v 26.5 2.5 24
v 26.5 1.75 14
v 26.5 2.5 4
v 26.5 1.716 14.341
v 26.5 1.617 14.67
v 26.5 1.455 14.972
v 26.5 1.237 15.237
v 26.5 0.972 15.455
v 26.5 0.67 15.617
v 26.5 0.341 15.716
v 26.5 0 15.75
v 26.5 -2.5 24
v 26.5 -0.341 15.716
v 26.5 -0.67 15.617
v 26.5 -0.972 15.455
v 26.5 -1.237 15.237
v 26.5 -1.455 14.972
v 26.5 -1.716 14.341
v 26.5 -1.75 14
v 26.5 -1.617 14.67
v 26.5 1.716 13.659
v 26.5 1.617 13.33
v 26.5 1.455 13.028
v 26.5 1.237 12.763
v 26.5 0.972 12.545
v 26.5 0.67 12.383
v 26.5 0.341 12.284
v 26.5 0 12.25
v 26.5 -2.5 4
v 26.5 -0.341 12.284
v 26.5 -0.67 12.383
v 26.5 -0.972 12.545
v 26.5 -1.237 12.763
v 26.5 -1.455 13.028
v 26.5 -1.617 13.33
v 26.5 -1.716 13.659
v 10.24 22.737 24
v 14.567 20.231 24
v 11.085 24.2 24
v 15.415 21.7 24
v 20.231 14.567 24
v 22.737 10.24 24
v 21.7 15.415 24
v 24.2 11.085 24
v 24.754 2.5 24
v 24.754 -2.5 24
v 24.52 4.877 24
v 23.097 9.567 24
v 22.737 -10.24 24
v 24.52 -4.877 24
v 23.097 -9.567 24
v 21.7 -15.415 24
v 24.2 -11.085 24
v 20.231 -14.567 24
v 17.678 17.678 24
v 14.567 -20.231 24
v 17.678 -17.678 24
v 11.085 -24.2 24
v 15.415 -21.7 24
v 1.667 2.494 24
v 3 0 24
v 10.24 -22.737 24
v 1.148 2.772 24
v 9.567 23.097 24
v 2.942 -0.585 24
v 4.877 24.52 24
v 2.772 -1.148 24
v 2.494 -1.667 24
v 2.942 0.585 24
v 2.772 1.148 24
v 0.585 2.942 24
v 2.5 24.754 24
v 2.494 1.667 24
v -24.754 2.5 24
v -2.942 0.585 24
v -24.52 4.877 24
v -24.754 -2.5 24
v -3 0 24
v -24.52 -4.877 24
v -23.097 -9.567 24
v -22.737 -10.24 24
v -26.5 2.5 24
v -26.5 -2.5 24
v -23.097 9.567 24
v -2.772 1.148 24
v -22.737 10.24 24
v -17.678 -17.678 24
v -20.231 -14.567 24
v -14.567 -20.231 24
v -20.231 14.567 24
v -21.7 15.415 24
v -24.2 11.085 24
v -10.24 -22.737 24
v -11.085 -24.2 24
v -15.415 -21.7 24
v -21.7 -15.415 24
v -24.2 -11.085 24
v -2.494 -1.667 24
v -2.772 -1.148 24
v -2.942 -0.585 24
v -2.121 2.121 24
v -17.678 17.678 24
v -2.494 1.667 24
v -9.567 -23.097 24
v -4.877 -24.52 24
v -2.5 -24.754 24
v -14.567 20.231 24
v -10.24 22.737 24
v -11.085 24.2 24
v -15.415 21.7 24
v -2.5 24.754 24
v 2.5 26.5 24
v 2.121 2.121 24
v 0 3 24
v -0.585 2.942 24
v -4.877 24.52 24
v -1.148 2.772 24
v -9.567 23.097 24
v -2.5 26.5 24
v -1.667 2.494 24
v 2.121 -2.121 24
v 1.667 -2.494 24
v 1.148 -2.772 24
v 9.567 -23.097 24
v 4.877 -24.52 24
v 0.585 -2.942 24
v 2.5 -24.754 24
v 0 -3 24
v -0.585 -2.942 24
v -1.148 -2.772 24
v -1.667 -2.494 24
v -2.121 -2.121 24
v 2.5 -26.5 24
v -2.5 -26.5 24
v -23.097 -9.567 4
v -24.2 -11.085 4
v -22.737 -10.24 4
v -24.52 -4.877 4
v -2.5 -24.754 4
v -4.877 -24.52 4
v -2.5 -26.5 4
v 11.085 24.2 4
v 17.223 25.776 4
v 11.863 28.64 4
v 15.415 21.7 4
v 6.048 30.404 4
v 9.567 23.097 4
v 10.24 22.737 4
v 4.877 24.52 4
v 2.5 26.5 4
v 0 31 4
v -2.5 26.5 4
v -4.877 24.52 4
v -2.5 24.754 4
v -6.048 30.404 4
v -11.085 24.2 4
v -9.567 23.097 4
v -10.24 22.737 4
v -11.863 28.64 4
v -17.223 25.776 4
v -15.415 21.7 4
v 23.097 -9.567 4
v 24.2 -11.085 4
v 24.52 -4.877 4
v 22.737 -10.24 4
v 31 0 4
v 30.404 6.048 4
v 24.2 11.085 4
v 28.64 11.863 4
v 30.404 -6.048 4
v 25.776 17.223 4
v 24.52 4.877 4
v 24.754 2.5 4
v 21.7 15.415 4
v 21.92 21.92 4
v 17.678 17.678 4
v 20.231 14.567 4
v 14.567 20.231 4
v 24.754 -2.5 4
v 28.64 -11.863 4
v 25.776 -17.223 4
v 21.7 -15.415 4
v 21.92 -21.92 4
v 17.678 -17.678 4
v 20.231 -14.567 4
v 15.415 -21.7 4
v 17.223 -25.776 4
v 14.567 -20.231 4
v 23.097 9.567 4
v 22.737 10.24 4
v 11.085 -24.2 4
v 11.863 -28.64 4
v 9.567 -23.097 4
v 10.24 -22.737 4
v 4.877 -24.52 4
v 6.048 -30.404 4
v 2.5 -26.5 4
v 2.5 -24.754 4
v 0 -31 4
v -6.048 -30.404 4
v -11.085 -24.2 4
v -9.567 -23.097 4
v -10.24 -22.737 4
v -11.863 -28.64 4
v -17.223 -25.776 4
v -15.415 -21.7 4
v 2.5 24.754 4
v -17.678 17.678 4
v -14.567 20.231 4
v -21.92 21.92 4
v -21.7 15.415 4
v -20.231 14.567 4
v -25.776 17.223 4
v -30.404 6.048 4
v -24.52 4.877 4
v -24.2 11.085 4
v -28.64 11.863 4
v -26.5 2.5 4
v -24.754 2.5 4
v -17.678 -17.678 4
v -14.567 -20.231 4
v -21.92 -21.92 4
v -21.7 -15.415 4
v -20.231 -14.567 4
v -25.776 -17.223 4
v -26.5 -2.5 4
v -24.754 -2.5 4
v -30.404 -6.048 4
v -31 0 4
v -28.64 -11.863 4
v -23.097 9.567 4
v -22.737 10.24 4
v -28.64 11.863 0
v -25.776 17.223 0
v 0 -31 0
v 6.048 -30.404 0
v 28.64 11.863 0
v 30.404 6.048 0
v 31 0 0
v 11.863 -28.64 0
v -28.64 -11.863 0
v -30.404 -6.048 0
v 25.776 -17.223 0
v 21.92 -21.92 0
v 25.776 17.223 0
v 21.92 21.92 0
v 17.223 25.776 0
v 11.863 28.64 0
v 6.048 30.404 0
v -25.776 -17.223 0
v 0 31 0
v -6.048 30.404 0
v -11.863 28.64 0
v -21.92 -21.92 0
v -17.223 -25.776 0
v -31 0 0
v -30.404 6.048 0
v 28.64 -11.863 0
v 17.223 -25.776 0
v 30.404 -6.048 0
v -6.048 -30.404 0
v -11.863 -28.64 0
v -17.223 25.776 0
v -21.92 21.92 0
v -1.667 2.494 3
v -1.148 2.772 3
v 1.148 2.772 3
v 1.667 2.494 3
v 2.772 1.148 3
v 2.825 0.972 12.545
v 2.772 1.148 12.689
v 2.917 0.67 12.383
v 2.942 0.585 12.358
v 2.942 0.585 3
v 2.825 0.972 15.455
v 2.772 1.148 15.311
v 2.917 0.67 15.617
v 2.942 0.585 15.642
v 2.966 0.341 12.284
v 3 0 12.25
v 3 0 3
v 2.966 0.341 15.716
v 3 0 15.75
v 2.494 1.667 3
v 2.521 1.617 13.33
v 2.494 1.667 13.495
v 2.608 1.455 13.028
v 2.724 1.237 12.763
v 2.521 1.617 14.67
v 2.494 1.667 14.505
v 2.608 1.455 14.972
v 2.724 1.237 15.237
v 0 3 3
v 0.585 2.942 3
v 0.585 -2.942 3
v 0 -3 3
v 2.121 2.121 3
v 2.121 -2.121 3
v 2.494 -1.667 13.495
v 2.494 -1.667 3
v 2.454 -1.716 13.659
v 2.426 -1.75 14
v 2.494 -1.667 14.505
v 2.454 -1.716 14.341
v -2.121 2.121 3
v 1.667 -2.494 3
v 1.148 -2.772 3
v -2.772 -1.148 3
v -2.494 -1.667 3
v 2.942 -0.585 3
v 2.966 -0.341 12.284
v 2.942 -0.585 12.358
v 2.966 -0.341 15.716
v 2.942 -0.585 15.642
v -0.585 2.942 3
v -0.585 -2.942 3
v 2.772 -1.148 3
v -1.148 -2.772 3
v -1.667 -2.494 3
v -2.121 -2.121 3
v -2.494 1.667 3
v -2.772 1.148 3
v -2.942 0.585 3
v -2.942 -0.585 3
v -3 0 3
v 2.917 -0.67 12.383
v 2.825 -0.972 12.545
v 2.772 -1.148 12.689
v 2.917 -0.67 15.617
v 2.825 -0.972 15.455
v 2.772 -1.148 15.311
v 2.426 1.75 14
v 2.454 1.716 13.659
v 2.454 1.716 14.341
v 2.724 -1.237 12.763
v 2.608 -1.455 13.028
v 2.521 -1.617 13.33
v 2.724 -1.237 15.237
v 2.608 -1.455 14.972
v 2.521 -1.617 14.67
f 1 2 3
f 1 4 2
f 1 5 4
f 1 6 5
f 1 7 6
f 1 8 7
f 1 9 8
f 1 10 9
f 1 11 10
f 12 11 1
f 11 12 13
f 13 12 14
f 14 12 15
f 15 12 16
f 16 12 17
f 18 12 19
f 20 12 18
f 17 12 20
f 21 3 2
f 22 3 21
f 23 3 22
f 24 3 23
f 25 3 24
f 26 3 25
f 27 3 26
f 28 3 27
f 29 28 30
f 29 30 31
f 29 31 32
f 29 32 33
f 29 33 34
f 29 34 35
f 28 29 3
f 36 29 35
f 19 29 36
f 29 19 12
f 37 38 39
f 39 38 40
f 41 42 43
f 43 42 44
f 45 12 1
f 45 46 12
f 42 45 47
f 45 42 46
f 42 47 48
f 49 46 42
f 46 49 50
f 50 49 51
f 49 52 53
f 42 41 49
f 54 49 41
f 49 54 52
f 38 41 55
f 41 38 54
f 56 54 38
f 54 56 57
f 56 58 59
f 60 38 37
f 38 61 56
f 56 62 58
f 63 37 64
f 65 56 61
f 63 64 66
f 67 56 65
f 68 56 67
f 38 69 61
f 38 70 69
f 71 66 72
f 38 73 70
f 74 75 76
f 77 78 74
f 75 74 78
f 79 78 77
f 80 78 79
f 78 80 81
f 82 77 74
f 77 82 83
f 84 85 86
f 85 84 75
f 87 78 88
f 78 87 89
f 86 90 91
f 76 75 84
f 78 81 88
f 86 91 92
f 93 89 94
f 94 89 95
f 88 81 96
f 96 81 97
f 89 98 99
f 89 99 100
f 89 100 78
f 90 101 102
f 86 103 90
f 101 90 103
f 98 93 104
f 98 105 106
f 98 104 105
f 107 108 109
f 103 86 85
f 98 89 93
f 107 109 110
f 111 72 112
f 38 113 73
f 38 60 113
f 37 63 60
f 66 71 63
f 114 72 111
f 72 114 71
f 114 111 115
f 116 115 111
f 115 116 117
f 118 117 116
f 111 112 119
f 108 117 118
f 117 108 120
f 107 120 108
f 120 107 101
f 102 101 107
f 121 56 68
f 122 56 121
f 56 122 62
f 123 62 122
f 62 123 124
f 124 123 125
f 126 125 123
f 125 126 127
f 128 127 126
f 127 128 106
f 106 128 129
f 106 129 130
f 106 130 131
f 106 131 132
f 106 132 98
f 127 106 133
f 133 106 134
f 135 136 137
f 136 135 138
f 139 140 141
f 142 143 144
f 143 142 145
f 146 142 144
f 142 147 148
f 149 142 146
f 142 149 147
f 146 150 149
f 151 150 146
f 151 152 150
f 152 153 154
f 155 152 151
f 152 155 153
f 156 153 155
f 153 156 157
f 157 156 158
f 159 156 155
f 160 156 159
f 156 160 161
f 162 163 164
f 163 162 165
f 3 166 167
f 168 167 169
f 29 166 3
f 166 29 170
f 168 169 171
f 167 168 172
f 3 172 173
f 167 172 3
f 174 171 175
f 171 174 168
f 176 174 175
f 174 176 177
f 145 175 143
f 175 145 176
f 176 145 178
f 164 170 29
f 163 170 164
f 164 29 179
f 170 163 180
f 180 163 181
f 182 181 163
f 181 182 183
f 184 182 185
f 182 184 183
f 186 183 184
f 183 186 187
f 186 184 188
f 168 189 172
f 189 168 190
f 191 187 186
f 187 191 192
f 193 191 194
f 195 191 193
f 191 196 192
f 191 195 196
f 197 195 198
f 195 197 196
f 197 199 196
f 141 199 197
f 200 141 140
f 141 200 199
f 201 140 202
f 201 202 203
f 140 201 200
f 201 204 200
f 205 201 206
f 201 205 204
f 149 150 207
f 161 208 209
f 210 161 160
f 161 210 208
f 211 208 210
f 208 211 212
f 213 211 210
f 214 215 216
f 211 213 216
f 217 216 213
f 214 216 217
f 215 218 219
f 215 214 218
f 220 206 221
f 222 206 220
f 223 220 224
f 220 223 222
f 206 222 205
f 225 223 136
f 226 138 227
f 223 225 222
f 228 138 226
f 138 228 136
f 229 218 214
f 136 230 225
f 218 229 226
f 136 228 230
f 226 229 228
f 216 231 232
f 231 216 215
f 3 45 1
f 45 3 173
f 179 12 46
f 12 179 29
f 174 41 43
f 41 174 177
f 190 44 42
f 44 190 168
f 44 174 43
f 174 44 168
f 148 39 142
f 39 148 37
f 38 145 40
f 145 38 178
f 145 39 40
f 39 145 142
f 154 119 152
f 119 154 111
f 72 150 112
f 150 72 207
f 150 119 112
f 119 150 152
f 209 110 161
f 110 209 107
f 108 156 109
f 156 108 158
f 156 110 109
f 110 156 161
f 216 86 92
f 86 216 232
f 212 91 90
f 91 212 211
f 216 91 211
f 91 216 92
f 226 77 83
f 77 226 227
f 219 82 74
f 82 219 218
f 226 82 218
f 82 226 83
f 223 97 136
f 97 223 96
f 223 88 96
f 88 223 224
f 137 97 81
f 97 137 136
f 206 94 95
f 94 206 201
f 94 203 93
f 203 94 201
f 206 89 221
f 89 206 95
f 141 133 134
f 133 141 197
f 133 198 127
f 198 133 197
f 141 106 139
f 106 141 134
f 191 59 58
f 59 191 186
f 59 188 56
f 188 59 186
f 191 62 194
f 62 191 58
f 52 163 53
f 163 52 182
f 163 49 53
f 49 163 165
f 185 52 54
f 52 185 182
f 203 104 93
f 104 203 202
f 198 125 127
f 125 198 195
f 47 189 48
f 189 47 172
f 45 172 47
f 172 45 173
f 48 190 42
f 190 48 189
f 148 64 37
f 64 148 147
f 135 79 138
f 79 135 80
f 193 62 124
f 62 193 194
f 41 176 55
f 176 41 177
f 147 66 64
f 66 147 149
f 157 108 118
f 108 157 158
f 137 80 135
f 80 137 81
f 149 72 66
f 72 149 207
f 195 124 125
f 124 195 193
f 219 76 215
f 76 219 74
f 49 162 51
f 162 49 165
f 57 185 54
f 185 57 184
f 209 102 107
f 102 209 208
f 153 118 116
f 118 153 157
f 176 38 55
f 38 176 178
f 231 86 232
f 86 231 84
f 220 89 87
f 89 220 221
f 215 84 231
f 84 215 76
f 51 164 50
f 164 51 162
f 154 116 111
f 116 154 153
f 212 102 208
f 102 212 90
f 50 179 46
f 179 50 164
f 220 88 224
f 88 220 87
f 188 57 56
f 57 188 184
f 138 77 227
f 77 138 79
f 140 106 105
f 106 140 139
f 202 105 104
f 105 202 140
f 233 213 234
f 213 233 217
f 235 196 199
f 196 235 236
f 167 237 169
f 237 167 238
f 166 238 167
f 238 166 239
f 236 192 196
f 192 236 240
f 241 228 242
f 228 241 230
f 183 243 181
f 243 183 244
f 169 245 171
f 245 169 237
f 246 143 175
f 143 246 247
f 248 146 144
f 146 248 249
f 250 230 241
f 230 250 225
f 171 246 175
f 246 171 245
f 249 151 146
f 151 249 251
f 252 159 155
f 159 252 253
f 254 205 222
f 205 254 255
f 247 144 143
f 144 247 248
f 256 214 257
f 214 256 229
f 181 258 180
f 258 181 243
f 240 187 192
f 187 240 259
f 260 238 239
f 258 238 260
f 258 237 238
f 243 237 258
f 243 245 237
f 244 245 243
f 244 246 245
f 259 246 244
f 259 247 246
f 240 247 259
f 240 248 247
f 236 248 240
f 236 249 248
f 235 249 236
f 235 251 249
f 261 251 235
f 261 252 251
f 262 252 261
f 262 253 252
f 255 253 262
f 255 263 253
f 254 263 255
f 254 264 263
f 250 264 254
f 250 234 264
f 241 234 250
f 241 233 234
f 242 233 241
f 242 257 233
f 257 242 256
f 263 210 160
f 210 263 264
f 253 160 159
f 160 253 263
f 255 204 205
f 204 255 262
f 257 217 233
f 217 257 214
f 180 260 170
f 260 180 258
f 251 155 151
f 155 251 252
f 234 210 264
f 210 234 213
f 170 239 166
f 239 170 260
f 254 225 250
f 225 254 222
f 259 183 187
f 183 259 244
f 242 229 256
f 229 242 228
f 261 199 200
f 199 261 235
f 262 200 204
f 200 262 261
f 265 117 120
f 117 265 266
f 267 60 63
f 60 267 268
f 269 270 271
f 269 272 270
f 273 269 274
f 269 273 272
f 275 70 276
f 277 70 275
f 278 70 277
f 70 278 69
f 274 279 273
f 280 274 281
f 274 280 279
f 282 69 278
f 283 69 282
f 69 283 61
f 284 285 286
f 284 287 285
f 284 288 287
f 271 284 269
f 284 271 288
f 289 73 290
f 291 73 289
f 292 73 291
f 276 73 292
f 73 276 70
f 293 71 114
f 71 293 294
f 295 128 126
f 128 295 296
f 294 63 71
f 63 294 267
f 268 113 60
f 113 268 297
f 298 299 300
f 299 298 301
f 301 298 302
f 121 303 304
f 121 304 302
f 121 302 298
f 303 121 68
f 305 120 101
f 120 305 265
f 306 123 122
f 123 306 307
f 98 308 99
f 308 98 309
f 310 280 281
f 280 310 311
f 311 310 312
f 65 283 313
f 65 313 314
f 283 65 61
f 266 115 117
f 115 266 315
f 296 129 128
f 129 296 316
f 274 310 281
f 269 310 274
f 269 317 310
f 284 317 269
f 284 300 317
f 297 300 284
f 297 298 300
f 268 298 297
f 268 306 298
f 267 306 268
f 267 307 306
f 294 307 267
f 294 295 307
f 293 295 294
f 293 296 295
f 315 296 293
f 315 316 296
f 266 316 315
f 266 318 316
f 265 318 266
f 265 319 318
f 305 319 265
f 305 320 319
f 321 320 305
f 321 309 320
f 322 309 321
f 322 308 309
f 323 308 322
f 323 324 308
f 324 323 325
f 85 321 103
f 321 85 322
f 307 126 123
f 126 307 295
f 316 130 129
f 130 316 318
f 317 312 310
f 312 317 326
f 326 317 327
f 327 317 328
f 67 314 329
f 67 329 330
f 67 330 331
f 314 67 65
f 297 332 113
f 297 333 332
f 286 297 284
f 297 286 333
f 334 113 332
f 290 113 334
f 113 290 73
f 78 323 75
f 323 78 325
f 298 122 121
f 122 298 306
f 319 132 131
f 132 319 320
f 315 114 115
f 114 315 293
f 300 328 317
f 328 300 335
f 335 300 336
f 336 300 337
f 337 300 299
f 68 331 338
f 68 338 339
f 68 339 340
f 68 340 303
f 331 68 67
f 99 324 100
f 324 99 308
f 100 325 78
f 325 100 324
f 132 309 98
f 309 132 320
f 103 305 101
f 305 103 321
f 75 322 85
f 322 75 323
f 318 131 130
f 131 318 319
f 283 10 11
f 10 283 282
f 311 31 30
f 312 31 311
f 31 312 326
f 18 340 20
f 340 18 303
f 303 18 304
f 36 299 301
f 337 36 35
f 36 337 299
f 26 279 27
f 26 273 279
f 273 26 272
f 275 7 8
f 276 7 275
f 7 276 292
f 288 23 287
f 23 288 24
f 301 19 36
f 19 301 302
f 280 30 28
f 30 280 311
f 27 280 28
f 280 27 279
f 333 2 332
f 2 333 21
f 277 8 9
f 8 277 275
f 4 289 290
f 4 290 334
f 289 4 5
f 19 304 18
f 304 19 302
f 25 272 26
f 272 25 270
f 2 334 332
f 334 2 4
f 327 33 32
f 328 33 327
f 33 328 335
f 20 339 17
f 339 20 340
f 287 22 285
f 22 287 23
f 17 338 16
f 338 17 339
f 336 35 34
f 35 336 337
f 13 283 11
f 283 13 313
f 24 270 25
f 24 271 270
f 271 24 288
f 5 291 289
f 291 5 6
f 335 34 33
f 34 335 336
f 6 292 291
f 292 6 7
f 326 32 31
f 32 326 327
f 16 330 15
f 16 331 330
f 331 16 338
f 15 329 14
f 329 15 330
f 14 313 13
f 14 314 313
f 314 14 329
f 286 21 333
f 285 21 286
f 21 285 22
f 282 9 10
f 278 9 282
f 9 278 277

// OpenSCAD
$fn = 32;

// ----------------------------------------------------------------------
// Control knob: skirt knob with grip ribs
// ----------------------------------------------------------------------

// --- parameters (mm) ---
skirt_d = 62;             // skirt diameter
skirt_t = 4;              // skirt thickness
rib_w = 5;                // grip rib width
rib_out = 2.5;            // grip rib radial protrusion
n_ribs = 12;              // number of grip ribs
knob_d = 50;              // knob body diameter
knob_h = 20;              // knob body height
bore_d = 6;               // shaft bore diameter
set_d = 3.5;              // set screw bore diameter

rib_step = 360 / n_ribs;  // rib angular step
total_h = skirt_t + knob_h;  // overall height

difference() {
  union() {
    translate([0, 0, skirt_t]) cylinder(h = knob_h, d = knob_d);
    cylinder(h = skirt_t, d = skirt_d);
    for (i = [0 : n_ribs - 1])
      rotate([0, 0, i * rib_step])
        translate([knob_d / 2 - 1, -rib_w / 2, skirt_t])
          cube([rib_out, rib_w, knob_h]);
  }
  translate([0, 0, skirt_t - 1]) cylinder(h = knob_h + 2, d = bore_d);
  translate([-1, 0, skirt_t + knob_h / 2]) rotate([0, 90, 0])
    cylinder(h = knob_d / 2 + bore_d / 2 + 2, d = set_d);
}
